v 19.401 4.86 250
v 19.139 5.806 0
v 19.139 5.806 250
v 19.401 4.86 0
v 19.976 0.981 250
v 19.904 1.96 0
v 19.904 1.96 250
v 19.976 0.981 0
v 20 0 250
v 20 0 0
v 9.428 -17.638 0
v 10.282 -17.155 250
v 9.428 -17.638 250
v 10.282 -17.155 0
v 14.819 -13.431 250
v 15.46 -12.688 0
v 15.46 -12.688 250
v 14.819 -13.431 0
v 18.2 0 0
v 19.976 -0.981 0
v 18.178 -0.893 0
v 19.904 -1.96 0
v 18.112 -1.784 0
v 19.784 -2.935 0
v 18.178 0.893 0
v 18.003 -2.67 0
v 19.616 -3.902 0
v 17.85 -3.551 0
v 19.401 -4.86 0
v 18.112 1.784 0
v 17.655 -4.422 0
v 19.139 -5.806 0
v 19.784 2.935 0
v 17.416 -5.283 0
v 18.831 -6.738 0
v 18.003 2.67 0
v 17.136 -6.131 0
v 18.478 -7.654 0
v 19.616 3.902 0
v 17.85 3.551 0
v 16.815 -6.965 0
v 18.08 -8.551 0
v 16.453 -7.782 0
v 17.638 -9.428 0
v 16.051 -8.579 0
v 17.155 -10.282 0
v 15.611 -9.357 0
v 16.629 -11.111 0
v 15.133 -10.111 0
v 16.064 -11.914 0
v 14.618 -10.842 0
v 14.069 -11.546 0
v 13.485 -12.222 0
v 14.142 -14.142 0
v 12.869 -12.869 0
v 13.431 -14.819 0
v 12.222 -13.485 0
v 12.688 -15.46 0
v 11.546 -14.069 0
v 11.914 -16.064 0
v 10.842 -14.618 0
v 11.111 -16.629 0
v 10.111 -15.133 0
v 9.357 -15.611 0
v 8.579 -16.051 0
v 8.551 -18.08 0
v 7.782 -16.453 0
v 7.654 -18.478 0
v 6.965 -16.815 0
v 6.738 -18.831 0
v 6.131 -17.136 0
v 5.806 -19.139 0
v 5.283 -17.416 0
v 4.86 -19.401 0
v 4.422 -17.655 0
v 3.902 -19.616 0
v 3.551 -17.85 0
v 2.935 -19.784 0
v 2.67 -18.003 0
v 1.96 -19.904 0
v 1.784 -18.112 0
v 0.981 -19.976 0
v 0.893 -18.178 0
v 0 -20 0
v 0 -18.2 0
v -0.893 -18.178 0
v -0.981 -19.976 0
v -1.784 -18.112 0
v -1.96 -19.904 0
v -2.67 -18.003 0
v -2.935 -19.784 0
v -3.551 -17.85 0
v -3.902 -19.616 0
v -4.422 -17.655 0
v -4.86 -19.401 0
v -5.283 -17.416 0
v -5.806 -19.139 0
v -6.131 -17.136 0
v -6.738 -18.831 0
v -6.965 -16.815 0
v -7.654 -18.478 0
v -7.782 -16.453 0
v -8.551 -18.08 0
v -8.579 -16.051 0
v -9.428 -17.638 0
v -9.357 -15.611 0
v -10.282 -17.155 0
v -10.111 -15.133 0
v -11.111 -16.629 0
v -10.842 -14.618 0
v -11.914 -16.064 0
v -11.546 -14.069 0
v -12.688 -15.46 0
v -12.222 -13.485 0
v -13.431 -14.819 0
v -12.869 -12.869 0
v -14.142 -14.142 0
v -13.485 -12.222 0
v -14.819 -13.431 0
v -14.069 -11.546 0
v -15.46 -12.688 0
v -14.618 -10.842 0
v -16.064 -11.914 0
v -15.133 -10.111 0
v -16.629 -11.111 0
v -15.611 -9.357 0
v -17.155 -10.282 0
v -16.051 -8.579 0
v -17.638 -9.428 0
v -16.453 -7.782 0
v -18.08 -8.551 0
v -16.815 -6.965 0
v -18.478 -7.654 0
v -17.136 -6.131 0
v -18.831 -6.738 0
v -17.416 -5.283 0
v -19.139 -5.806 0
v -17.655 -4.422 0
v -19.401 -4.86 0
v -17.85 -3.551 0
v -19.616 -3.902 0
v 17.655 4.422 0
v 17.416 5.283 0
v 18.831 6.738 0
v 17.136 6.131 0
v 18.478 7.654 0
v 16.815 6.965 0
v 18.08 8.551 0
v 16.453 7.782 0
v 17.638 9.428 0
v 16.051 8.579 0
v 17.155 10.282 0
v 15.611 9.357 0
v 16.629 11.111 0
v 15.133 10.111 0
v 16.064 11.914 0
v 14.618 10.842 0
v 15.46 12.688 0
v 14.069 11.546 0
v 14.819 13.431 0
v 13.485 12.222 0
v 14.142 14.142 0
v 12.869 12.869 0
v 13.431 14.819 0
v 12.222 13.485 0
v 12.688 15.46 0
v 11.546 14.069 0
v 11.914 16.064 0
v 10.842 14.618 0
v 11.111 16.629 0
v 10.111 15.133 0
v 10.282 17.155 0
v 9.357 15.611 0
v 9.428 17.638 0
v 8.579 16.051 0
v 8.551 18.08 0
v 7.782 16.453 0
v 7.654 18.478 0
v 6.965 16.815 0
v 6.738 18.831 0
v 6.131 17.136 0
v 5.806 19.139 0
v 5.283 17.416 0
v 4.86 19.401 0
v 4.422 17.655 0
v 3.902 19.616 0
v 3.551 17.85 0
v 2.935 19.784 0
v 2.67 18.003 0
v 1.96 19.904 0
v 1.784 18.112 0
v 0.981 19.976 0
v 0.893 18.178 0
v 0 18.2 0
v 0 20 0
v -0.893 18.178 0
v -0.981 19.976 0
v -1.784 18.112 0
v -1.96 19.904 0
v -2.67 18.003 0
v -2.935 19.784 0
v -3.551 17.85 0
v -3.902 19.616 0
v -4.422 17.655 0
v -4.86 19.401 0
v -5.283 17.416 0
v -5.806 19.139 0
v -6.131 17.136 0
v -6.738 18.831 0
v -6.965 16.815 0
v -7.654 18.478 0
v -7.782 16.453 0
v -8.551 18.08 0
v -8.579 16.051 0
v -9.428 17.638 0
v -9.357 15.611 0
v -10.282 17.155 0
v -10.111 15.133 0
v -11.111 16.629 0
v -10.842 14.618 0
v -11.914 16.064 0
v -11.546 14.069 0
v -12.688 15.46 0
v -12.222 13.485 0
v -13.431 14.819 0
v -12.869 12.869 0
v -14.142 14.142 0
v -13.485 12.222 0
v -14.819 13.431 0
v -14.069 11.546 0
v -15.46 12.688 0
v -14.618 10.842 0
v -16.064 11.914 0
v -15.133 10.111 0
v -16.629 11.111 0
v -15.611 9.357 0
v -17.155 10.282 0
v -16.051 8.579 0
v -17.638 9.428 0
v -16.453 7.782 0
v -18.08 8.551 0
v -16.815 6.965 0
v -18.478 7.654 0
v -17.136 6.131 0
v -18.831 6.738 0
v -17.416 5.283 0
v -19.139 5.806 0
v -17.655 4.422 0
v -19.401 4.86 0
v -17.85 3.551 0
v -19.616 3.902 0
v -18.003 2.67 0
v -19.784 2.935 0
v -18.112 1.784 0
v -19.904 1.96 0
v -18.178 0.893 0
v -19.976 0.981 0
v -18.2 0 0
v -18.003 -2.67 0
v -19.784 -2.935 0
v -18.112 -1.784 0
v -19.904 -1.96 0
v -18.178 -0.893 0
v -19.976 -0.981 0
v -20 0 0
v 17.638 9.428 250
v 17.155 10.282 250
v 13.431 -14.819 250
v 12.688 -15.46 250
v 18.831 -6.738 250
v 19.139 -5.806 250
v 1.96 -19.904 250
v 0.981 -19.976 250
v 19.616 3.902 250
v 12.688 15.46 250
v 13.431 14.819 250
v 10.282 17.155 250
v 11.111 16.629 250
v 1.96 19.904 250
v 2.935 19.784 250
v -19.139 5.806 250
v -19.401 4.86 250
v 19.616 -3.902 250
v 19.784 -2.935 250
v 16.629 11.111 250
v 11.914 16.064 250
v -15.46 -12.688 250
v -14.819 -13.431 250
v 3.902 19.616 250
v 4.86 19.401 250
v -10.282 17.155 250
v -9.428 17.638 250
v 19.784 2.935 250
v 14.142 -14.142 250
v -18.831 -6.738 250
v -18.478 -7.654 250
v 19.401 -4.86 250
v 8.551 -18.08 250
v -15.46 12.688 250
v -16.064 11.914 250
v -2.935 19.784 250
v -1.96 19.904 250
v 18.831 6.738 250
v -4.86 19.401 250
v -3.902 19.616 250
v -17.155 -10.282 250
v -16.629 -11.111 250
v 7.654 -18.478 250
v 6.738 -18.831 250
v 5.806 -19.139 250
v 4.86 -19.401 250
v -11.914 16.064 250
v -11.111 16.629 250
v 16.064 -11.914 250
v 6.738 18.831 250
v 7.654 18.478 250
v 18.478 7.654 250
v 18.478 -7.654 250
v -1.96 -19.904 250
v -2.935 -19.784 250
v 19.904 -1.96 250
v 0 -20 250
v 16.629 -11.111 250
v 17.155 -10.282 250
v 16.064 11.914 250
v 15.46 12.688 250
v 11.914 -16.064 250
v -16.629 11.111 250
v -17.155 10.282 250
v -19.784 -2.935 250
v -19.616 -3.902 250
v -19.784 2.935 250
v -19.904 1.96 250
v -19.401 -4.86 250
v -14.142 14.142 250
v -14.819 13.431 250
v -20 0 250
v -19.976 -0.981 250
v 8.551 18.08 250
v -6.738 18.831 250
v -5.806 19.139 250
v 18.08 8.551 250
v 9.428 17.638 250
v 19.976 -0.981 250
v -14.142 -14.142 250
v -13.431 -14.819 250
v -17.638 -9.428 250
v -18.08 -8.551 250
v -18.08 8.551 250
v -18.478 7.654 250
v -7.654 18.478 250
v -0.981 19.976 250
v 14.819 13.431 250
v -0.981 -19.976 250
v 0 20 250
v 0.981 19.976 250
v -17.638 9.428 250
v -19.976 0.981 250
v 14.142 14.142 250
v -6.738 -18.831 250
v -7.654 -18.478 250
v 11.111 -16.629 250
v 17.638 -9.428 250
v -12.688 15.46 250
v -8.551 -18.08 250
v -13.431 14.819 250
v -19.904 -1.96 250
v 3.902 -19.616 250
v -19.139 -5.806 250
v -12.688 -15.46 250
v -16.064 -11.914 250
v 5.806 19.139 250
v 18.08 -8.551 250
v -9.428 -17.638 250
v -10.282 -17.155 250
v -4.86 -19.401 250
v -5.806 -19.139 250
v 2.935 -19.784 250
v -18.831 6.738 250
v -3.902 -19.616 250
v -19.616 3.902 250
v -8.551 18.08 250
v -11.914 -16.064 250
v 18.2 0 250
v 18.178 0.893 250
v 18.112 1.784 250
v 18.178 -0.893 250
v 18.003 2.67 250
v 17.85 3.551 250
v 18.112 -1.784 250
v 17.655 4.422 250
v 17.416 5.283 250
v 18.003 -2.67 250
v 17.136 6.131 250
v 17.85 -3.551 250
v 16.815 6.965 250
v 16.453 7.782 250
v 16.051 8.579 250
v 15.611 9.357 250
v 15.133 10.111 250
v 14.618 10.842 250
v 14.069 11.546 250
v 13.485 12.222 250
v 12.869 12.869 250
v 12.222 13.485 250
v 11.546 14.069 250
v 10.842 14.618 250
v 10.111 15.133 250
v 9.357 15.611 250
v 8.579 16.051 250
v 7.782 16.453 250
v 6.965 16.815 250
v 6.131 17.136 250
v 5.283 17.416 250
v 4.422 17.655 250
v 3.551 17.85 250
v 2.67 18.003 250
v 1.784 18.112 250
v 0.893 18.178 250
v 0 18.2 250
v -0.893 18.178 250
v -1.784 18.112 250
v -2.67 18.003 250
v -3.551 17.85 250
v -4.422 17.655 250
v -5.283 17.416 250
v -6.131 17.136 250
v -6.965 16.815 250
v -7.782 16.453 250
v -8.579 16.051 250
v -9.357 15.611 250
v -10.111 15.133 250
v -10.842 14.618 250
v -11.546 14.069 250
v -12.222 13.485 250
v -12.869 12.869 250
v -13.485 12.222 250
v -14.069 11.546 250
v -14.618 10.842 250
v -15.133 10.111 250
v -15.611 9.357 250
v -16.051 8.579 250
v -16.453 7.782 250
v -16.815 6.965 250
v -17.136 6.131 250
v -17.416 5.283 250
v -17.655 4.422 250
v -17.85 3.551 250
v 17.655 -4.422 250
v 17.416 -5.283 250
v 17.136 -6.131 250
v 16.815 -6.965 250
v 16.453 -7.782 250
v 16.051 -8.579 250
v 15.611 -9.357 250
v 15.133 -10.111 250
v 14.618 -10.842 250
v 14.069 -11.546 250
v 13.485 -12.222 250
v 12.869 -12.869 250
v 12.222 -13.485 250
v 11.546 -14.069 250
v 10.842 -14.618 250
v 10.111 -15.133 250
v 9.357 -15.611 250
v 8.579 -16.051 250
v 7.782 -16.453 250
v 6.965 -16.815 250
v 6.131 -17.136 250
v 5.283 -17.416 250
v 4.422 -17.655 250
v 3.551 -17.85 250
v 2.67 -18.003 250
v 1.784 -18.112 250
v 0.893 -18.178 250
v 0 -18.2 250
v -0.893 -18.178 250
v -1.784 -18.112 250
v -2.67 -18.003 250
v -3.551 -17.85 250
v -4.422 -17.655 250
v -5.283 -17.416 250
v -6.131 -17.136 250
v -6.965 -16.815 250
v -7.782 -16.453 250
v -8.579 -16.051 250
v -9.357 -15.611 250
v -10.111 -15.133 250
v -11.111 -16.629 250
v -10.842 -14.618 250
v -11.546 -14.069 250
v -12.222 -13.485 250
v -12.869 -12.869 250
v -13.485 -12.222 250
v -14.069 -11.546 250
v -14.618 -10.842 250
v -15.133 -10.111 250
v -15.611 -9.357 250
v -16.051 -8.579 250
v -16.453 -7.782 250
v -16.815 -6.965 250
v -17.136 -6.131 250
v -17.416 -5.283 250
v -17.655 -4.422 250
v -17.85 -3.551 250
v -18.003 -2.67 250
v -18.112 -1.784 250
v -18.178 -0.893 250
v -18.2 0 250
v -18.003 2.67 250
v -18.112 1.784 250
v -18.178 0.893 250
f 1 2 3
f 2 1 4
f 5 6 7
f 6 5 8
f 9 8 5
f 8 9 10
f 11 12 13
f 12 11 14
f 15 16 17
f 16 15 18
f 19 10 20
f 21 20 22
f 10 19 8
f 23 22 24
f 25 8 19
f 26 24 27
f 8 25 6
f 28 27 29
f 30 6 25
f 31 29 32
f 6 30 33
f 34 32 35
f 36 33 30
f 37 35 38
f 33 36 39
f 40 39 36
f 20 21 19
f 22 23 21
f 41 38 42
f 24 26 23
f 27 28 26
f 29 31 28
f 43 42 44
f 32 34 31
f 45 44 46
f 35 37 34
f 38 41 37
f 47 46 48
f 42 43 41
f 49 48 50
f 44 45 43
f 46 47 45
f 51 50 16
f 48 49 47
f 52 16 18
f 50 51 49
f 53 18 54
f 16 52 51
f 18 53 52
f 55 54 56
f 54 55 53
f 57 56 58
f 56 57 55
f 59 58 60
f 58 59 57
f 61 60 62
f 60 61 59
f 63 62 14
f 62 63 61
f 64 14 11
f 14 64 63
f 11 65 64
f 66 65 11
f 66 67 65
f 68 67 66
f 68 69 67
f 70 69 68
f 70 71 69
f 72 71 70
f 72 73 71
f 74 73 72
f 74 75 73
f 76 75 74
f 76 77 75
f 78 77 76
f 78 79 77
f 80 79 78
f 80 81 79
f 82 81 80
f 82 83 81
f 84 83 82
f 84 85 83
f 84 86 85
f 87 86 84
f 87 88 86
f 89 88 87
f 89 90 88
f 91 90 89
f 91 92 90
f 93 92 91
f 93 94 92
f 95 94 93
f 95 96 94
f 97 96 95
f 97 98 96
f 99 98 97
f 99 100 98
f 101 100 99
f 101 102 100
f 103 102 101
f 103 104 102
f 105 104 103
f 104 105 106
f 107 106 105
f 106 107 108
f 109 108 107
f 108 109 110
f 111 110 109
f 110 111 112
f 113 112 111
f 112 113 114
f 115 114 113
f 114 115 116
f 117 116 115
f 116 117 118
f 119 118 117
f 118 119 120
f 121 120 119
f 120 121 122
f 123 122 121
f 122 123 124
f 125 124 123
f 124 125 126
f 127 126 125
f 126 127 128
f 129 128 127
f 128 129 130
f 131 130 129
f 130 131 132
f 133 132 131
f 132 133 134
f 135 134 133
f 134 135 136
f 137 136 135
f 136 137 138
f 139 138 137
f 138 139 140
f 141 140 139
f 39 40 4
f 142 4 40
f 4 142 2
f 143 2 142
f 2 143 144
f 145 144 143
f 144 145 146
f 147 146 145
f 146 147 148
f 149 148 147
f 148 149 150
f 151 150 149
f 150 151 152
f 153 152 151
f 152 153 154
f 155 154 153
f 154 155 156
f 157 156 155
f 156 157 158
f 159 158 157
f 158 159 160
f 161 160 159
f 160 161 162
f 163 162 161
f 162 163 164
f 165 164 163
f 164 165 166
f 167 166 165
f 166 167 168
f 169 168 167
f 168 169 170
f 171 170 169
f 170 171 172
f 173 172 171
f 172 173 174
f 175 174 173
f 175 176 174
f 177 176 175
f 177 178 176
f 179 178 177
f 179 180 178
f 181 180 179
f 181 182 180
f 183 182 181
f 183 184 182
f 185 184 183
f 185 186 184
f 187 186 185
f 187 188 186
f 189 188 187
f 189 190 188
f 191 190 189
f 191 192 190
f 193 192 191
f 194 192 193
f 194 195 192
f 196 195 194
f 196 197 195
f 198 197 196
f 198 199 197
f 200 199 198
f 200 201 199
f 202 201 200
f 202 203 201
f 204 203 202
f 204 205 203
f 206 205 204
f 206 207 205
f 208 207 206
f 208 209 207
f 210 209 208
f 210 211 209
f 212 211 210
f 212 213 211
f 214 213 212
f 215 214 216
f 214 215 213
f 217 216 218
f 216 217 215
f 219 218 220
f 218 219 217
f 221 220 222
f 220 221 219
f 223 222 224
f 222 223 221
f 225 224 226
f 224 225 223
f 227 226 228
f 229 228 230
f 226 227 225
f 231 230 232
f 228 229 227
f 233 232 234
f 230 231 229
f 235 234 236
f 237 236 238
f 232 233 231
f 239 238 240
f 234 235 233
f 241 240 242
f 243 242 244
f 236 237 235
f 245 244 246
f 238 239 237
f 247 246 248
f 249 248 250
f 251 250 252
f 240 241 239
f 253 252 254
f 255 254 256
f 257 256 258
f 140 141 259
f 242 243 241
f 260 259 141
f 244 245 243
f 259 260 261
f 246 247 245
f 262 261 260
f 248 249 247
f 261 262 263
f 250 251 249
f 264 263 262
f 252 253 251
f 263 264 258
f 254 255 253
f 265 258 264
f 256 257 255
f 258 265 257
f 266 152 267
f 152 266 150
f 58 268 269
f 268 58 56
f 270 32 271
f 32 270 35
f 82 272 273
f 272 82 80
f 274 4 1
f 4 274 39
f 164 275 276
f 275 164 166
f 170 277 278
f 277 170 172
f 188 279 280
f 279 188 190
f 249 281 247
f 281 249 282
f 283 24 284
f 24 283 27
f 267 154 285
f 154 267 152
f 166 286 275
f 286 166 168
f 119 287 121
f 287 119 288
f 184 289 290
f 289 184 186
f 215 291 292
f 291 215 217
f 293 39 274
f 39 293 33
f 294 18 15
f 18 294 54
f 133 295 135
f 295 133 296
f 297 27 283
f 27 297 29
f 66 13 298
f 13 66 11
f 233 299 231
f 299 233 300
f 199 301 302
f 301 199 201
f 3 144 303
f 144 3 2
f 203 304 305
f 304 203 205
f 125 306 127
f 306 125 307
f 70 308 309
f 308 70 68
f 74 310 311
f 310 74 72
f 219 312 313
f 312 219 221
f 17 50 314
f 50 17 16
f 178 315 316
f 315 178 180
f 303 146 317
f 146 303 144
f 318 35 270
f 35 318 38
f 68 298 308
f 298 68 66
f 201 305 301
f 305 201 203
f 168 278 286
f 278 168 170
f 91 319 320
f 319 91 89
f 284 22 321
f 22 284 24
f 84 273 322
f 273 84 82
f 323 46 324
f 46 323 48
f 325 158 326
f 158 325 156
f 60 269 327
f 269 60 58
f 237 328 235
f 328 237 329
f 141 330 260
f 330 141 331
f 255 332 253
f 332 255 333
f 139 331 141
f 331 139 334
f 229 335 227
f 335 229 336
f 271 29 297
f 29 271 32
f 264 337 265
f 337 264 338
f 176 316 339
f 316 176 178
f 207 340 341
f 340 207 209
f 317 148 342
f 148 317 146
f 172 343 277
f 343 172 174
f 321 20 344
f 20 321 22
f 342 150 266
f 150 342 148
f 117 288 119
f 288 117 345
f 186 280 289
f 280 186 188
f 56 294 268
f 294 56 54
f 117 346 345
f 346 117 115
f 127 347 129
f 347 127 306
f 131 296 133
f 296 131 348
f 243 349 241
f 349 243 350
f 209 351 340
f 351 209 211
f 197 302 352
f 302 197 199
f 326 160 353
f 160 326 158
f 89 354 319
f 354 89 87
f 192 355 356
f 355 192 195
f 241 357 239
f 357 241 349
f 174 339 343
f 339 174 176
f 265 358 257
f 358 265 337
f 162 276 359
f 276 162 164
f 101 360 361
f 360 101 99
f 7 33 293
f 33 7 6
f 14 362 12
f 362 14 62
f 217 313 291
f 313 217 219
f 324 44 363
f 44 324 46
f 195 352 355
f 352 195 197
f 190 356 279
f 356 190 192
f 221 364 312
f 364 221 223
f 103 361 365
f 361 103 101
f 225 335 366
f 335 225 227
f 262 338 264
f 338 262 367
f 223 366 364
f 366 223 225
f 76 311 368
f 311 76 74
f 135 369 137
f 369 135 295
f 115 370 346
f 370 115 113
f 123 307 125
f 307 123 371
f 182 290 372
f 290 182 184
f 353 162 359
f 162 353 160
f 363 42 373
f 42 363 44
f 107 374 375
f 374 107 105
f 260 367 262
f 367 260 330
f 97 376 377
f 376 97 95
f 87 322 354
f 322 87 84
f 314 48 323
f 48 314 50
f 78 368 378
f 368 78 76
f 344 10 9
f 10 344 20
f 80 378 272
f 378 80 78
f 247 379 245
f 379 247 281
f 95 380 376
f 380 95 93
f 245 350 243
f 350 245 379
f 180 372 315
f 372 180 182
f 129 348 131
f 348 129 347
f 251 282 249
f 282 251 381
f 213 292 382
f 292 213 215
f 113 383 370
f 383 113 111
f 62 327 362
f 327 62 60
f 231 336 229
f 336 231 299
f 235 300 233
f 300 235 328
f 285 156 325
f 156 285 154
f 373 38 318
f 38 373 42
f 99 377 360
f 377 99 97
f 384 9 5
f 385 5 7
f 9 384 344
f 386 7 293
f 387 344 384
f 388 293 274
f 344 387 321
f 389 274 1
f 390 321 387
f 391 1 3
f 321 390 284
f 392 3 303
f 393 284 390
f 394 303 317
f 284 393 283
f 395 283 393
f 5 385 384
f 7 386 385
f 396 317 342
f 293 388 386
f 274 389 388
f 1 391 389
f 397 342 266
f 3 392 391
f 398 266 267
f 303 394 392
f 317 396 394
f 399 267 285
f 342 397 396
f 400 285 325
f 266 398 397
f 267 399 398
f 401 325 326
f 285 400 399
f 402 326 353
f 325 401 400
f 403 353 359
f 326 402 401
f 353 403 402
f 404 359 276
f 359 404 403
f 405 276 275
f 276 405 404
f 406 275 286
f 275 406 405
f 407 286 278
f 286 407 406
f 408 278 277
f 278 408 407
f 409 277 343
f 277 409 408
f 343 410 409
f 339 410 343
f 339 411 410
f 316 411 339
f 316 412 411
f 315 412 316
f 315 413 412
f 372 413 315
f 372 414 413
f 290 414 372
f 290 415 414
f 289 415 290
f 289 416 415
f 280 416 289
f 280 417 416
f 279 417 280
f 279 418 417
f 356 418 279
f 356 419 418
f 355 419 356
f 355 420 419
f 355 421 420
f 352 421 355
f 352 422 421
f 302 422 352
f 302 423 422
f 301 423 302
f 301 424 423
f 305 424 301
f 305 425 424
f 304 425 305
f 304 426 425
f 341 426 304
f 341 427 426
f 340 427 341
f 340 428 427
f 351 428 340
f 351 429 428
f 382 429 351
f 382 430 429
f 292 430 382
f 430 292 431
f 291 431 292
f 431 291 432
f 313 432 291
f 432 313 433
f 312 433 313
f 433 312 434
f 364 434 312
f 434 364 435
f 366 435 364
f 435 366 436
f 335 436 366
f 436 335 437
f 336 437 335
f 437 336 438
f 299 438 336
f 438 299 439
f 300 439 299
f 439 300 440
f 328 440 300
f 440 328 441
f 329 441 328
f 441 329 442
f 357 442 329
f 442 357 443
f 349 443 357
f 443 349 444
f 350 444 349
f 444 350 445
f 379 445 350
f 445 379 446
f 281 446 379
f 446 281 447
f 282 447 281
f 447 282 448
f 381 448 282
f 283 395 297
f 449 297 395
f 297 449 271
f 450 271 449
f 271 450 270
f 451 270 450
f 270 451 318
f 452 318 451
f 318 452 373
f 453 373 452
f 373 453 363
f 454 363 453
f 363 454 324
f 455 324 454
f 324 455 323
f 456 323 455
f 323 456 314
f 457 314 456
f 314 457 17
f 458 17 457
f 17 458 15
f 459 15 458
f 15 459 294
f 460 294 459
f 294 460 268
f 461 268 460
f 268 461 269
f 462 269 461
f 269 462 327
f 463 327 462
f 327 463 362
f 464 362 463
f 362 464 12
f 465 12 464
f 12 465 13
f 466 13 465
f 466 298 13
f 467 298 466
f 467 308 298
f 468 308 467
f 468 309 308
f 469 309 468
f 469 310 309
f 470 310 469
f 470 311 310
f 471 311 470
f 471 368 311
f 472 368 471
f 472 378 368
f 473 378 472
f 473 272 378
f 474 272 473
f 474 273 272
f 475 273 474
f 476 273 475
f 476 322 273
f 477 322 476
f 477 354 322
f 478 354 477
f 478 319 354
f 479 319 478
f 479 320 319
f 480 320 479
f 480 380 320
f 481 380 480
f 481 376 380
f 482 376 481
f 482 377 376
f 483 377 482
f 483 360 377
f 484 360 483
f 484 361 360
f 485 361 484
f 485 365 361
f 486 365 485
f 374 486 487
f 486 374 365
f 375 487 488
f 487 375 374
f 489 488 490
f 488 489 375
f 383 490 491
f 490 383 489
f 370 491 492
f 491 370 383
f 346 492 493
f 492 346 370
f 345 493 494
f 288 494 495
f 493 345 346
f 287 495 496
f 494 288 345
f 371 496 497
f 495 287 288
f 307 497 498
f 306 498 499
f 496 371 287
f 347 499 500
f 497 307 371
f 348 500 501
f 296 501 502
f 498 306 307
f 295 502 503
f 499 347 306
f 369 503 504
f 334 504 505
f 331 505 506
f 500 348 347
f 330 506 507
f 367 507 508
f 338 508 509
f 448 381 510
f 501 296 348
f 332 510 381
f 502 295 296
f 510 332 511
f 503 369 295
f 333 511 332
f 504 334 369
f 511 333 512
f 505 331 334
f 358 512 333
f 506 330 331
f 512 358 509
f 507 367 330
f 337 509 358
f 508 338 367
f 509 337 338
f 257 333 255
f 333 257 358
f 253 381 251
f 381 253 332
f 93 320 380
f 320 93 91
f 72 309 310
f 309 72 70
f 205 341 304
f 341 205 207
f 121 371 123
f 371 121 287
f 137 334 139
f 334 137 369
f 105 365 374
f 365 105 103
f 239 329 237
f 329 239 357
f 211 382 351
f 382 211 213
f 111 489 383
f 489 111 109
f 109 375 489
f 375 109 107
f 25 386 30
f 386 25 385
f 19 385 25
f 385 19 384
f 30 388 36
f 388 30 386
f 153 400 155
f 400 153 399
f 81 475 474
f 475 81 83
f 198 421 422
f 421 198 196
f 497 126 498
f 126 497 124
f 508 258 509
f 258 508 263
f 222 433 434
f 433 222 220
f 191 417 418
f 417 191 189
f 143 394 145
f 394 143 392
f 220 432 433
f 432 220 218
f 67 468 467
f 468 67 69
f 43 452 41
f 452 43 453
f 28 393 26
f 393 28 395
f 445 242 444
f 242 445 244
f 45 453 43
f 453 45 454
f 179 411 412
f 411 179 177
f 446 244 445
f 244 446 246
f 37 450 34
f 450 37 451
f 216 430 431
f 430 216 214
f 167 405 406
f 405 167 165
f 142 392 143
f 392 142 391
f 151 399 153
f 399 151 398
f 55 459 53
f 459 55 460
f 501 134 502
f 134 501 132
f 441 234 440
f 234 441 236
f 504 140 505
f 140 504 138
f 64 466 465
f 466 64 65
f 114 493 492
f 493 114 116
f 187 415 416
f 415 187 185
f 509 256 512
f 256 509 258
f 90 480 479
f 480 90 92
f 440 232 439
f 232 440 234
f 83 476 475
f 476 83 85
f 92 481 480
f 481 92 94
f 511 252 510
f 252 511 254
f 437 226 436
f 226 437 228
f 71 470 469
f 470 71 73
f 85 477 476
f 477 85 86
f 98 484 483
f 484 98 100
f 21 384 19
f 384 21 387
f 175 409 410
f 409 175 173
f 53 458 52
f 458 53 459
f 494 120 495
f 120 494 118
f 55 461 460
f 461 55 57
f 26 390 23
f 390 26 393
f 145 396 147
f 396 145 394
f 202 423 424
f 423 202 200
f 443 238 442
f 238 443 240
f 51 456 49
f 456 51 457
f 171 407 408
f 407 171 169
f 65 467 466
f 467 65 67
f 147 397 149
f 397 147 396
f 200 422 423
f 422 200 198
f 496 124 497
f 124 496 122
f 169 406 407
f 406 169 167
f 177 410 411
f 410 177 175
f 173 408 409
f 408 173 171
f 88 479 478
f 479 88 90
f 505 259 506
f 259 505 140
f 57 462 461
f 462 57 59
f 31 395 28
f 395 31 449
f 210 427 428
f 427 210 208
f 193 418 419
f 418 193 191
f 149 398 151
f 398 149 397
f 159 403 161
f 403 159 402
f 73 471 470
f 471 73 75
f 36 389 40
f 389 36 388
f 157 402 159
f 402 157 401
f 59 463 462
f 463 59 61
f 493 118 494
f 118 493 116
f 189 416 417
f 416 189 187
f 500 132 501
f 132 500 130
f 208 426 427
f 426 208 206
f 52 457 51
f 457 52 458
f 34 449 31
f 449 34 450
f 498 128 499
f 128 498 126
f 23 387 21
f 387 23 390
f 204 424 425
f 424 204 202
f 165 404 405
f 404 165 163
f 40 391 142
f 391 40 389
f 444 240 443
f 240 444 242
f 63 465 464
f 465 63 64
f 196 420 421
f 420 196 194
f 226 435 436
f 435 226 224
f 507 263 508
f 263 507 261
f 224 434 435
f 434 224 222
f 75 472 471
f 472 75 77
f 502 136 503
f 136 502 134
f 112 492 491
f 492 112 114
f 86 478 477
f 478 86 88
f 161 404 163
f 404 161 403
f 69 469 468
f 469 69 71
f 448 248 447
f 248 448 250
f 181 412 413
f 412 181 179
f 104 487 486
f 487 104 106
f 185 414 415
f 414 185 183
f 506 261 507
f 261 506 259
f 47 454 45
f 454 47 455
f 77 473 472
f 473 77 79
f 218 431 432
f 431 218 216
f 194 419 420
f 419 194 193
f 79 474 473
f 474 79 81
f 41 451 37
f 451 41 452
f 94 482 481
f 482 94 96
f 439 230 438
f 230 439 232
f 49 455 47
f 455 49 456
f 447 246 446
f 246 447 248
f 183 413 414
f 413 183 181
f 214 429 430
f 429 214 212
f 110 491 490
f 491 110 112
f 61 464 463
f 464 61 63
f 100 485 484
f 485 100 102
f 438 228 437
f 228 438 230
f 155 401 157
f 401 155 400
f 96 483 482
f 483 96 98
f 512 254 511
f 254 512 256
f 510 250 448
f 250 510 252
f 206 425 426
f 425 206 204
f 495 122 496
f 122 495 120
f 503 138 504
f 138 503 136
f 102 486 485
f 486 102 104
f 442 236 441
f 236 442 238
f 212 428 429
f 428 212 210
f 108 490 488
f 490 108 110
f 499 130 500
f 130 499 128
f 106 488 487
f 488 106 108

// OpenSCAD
$fn = 128;

// HT pipe (approx.) - DN40, length 250 mm
// Typical HT DN40 dimensions (approx):
// Outer diameter: 40 mm
// Wall thickness: 1.8 mm  -> Inner diameter: 36.4 mm
// Length: 250 mm

od = 40;
wall = 1.8;
id = od - 2*wall;
len = 250;

difference() {
  cylinder(h = len, d = od);
  translate([0,0,-0.1]) cylinder(h = len + 0.2, d = id);
}
